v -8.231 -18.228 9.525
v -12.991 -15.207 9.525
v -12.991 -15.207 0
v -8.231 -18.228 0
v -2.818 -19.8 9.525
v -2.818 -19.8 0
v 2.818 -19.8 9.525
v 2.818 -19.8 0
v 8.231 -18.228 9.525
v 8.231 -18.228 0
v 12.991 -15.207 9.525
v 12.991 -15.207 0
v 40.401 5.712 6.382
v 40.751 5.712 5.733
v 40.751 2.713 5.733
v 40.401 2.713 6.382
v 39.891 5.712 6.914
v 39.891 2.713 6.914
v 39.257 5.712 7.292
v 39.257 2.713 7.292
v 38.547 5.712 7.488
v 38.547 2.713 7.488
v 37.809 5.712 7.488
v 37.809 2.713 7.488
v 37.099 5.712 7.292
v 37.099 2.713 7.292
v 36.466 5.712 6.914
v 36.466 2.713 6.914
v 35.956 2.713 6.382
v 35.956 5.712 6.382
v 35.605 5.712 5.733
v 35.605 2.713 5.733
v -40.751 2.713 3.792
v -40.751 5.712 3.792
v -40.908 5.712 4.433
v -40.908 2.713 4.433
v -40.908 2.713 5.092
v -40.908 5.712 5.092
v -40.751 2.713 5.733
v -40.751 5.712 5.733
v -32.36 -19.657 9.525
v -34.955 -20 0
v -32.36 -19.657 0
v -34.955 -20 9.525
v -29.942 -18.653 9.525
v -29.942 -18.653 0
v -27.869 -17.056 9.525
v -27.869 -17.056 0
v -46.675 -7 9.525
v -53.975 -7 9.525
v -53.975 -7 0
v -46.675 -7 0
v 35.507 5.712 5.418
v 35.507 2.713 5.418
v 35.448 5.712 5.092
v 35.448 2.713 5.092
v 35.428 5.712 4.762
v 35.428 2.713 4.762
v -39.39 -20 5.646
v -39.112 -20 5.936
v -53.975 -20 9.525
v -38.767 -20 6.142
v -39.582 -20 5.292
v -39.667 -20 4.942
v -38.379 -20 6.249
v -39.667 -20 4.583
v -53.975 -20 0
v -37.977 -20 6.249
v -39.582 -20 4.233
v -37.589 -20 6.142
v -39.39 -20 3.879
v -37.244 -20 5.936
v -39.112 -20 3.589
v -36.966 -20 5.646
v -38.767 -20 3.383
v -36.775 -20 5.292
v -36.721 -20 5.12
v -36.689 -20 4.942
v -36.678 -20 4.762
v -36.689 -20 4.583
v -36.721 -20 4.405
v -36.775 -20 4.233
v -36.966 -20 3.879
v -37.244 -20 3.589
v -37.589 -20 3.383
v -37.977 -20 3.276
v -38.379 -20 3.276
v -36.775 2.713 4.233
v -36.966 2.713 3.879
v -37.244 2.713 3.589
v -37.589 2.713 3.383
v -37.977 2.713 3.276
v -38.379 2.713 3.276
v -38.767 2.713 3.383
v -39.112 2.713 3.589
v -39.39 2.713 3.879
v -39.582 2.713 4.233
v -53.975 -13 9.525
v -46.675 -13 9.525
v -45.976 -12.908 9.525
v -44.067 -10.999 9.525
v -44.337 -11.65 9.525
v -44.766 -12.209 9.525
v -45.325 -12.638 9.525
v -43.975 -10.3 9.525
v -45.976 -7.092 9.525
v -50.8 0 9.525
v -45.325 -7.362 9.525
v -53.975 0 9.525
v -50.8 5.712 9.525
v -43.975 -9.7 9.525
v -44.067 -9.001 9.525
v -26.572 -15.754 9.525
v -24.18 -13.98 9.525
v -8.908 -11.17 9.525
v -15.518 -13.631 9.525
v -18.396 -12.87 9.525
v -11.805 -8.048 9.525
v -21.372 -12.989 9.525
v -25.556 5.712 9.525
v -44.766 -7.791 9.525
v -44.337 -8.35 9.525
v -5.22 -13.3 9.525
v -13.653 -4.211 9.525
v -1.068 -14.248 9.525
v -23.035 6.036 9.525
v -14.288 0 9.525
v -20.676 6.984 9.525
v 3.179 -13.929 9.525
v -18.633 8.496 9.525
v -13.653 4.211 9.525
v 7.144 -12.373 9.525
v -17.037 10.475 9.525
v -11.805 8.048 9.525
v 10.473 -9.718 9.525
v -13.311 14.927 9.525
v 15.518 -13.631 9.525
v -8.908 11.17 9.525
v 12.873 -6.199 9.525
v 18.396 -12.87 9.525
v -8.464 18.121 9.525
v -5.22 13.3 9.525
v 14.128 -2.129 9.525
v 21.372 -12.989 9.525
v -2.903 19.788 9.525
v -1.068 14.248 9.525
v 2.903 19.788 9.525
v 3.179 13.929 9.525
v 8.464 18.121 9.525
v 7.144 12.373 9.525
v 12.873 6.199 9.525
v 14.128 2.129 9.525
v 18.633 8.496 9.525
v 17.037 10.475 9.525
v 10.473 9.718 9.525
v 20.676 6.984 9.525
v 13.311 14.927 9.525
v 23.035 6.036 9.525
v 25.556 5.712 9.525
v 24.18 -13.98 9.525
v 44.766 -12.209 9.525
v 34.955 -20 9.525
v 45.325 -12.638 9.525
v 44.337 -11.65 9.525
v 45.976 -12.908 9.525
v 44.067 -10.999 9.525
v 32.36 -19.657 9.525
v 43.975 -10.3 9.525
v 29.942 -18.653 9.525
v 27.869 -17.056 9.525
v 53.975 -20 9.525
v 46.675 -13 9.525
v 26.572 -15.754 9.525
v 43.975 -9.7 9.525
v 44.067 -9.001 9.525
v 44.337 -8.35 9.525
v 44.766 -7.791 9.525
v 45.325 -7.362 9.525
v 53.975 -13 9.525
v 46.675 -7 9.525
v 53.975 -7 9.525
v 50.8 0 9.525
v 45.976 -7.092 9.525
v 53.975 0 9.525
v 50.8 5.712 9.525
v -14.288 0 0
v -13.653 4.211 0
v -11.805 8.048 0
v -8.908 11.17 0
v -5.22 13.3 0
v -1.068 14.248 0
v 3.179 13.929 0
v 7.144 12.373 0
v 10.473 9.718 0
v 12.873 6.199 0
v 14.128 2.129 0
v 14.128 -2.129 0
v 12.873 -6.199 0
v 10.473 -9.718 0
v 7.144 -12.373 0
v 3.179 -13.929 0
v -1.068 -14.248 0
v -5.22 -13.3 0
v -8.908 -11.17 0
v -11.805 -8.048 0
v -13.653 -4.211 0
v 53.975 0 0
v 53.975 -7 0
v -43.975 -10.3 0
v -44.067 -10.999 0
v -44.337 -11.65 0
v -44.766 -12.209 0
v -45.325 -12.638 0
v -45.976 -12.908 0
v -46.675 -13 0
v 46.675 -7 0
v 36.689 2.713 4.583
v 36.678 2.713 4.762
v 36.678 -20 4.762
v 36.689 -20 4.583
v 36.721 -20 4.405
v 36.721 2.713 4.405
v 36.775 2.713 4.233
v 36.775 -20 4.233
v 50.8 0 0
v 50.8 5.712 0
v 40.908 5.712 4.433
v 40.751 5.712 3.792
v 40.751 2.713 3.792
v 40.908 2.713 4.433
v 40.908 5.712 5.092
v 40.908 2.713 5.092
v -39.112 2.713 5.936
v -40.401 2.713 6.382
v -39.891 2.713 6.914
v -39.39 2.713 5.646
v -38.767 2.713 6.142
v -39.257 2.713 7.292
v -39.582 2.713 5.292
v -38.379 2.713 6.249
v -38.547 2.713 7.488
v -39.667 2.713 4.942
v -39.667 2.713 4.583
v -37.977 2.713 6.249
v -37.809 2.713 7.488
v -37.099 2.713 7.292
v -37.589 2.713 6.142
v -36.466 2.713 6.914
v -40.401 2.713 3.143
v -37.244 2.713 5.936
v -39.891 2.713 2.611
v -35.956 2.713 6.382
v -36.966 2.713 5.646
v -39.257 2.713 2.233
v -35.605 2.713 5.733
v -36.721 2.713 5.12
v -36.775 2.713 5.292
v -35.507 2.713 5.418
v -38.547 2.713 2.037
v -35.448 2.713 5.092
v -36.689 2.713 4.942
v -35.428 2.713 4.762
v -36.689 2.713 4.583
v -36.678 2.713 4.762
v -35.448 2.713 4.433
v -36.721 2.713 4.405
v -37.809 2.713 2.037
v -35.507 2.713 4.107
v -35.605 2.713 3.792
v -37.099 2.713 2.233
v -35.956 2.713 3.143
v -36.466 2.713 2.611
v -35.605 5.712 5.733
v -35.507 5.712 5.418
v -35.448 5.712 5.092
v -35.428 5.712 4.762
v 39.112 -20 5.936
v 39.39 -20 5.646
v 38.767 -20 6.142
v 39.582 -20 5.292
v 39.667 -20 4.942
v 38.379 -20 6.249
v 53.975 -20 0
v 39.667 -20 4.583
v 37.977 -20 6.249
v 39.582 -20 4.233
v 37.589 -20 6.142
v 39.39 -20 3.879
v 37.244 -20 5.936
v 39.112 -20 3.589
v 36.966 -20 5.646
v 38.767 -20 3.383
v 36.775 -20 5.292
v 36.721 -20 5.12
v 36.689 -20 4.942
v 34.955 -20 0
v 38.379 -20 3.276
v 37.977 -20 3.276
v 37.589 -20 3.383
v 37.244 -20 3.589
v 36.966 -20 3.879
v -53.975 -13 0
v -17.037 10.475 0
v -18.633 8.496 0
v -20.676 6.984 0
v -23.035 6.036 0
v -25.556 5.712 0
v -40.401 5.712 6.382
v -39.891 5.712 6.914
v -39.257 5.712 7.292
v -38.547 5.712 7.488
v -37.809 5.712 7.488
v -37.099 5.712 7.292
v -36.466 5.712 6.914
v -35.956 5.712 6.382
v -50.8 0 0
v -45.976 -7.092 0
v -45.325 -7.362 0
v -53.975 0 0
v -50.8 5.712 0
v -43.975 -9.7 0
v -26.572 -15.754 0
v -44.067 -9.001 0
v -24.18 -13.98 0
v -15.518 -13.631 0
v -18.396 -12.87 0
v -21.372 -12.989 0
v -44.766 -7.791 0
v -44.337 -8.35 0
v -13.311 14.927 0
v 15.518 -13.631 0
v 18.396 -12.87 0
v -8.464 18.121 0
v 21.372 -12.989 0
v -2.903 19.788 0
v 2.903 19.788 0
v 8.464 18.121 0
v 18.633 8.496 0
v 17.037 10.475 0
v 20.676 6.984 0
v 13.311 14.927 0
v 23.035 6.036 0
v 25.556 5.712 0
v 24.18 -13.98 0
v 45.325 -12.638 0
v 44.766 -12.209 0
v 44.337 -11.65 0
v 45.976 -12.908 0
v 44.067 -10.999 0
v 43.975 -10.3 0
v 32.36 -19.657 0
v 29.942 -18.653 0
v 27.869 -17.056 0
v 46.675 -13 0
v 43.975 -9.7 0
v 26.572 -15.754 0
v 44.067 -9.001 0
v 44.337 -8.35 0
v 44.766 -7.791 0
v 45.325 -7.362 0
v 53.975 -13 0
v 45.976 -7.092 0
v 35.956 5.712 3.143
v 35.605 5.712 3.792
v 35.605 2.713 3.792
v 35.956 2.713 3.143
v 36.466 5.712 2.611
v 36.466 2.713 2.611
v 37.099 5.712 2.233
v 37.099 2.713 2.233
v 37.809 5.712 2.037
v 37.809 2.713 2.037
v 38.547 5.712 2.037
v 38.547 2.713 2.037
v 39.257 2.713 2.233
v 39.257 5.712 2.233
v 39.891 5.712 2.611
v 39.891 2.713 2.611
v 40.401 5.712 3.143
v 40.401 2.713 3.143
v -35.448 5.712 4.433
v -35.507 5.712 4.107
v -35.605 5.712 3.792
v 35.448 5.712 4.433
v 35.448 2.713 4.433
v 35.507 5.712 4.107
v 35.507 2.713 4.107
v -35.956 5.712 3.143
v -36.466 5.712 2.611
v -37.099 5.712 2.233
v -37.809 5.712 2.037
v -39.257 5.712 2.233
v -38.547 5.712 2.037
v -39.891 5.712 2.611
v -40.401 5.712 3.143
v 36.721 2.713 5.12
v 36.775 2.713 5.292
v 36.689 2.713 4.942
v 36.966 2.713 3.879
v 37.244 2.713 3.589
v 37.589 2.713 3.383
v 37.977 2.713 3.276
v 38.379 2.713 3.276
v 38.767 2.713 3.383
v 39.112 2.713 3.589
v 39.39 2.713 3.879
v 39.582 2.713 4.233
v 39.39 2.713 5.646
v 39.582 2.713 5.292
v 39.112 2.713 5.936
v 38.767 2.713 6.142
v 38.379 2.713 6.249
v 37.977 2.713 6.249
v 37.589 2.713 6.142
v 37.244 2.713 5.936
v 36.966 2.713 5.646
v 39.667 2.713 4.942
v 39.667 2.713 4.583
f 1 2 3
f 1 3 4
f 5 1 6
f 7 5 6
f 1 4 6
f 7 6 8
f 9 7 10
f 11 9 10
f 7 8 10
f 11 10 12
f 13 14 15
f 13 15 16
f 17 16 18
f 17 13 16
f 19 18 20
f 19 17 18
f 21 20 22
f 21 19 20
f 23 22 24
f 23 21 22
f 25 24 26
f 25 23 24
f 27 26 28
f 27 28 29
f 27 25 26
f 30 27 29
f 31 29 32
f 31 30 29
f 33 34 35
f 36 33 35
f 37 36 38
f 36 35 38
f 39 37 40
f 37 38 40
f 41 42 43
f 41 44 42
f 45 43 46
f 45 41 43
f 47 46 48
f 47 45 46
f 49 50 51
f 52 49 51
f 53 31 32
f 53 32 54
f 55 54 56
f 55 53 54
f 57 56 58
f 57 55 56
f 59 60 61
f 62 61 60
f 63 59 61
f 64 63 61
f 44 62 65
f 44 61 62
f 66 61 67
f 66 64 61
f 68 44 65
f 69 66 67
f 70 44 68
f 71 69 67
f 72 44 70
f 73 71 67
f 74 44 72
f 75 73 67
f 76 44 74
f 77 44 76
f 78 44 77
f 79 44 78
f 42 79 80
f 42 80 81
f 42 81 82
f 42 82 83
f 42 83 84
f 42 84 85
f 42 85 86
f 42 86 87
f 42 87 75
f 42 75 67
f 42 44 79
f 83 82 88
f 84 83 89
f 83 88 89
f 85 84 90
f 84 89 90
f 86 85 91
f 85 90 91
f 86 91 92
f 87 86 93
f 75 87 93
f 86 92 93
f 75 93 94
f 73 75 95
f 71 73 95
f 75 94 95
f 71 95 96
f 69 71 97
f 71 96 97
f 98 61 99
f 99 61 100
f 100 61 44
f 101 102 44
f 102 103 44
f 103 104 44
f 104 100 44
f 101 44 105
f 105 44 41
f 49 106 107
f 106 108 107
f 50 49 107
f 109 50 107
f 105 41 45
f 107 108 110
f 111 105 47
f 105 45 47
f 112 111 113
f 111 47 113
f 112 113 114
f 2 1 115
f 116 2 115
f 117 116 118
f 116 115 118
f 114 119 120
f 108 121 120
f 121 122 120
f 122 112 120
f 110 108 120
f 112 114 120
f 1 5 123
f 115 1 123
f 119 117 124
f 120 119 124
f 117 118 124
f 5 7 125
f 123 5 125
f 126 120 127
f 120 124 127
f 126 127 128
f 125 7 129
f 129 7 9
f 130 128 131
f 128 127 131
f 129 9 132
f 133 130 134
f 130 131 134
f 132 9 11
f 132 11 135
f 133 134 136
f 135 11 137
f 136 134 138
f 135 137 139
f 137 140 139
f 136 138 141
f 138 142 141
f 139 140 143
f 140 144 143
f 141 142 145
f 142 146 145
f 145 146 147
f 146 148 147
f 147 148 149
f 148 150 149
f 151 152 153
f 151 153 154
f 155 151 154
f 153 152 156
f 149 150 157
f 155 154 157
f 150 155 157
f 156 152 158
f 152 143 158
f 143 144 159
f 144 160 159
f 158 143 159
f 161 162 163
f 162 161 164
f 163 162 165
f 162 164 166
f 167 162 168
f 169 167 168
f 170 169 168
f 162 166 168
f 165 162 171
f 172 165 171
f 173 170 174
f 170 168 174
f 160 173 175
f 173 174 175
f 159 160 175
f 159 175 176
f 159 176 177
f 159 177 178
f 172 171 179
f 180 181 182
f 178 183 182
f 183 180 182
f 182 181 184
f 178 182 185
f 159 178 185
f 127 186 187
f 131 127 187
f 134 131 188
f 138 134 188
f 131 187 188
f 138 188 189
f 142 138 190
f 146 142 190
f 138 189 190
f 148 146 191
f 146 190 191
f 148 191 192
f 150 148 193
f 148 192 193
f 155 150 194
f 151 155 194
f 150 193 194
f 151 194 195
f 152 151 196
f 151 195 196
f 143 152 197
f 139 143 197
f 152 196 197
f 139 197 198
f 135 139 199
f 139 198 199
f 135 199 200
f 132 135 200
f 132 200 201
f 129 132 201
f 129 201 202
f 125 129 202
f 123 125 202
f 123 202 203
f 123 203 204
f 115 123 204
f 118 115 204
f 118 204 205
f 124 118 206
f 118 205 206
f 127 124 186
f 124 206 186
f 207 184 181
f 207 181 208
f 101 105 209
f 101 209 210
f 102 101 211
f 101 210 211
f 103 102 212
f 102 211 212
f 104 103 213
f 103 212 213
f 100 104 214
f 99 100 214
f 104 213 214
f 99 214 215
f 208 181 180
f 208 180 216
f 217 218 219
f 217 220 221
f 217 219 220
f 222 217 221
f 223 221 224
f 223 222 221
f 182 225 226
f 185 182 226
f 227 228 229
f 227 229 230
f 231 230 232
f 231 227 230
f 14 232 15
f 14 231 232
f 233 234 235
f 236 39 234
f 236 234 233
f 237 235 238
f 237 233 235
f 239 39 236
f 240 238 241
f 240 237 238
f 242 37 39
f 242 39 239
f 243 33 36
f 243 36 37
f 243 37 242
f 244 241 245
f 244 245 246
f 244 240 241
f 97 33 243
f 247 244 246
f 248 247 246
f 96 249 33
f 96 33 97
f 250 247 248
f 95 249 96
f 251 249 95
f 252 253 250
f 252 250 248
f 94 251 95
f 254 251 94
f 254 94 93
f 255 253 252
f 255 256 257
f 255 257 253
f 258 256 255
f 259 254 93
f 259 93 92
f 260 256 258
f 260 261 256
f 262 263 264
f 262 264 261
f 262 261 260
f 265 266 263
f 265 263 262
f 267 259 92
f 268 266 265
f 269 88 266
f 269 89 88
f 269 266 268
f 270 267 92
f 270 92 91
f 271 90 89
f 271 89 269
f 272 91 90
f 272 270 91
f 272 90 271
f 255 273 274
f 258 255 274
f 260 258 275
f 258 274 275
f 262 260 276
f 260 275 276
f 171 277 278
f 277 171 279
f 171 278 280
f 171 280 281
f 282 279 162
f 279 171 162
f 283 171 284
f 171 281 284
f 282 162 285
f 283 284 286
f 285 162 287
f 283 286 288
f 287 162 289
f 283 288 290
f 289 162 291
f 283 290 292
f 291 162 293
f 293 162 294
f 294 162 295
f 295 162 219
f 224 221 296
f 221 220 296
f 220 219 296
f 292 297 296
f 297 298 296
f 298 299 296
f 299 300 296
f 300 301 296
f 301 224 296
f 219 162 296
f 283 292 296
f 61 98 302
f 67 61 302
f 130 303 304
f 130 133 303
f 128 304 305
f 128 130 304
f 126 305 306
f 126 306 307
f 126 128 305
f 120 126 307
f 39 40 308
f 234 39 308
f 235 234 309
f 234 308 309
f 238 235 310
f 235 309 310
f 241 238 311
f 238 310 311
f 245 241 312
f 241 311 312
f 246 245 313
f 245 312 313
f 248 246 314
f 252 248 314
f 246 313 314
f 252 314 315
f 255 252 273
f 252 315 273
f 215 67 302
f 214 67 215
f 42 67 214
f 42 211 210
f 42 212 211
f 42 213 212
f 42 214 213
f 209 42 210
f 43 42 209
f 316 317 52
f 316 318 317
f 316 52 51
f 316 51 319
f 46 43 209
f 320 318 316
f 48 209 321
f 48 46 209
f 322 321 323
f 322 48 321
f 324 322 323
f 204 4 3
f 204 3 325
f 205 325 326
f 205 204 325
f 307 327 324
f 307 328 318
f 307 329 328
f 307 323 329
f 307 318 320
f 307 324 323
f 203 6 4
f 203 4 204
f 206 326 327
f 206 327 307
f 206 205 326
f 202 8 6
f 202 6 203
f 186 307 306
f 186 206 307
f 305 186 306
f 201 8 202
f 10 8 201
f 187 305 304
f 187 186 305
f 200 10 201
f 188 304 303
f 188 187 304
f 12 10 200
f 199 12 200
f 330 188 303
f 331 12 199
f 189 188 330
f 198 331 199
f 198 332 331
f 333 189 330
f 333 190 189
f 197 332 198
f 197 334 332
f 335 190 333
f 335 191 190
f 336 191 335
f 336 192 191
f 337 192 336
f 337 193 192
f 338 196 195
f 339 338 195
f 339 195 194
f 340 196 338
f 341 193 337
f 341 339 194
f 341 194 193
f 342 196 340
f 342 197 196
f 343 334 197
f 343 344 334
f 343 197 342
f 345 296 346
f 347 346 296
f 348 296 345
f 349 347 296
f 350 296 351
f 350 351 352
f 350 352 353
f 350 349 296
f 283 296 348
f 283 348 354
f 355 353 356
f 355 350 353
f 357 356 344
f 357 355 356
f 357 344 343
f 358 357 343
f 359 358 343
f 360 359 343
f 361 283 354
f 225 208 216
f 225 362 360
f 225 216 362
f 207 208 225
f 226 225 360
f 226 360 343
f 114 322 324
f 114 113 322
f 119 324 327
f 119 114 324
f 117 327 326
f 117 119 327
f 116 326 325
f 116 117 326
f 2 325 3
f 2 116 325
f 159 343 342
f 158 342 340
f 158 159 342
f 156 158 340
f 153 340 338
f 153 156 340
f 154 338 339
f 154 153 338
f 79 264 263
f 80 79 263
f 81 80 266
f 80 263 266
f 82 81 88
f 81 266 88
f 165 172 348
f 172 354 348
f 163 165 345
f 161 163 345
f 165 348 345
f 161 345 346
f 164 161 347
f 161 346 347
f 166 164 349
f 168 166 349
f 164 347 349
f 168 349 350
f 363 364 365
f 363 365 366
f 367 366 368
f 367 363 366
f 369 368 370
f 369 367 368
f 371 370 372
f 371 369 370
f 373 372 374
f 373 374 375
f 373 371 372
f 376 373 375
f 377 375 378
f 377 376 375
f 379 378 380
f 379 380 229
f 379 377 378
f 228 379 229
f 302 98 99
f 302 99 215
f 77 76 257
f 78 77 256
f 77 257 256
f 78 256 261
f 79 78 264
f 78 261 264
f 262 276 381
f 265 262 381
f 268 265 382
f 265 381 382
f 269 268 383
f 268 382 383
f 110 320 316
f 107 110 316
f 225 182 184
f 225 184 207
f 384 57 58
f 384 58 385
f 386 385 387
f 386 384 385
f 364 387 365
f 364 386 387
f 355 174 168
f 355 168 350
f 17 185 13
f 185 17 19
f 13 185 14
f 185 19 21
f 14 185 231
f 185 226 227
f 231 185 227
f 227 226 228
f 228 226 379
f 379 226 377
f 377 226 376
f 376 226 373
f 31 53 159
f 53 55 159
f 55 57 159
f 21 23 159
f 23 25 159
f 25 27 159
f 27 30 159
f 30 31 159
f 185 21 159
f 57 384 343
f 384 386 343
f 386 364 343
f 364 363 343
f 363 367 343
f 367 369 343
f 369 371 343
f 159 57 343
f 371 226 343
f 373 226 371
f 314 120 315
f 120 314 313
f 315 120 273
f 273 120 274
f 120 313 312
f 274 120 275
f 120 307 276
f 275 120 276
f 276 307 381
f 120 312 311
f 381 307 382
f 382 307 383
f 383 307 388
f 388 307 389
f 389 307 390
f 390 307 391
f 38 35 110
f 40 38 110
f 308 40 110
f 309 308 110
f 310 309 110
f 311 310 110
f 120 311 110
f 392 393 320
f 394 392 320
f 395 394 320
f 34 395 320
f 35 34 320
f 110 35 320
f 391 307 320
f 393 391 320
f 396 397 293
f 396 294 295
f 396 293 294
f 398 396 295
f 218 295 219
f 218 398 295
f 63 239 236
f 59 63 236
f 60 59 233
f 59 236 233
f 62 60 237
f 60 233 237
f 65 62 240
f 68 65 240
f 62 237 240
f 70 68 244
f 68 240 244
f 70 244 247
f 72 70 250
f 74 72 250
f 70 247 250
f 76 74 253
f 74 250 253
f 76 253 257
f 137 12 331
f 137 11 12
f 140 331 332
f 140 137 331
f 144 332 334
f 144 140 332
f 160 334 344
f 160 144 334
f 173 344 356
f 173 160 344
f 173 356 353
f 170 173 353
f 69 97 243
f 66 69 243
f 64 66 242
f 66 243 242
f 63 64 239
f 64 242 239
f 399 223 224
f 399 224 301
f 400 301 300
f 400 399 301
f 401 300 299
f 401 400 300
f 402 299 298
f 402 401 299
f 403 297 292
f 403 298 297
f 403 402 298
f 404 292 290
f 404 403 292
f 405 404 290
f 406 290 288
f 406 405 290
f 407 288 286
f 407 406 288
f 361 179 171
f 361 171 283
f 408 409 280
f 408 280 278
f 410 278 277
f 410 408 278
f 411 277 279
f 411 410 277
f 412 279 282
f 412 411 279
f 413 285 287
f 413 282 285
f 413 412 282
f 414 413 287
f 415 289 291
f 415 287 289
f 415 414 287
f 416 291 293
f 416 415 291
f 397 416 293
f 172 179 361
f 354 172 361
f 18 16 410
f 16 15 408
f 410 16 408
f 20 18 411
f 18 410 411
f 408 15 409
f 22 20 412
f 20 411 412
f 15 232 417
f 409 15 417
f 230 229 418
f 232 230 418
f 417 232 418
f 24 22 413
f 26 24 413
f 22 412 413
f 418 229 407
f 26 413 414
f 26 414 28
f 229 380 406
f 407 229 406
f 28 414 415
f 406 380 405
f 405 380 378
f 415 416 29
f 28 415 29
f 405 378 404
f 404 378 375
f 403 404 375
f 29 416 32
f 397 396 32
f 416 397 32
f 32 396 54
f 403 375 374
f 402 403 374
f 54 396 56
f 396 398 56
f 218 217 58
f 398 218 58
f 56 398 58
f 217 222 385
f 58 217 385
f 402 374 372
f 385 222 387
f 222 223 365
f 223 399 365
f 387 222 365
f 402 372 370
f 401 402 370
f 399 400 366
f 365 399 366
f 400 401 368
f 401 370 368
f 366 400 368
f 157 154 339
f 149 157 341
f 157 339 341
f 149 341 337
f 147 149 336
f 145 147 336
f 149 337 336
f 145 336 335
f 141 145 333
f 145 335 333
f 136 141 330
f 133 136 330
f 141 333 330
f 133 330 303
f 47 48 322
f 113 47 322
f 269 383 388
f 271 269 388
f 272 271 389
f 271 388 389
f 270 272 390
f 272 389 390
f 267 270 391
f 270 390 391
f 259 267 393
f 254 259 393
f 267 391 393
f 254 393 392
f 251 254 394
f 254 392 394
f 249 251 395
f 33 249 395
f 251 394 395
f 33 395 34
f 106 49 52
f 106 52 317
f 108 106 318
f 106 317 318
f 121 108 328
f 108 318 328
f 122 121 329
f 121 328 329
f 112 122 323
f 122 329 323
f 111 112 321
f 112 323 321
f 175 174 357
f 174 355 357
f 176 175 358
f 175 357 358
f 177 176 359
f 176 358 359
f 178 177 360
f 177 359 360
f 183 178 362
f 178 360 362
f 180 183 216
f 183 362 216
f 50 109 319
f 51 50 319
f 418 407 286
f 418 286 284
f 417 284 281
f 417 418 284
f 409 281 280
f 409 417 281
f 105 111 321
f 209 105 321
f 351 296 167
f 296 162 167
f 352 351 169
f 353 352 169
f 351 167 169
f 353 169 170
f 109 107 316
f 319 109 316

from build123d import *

# Parameters (mm, degrees)
SKETCH1_R           = 14.2875
BOSS_EXTRUDE1_DEPTH = 9.525
SKETCH2_W           = 9.525
SKETCH2_H           = 20
BOSS_EXTRUDE3_DEPTH = 3.175
FILLET1_R           = 10
FILLET2_R           = 10
SKETCH3_R           = 2.75
SKETCH3_R_2         = 1.5
CUT_EXTRUDE1_DEPTH  = 3
SKETCH3_4_R         = 1.5
CUT_EXTRUDE2_DEPTH  = 61.54055588
SKETCH4_W           = 9.525
SKETCH4_H           = 6
CUT_EXTRUDE3_DEPTH  = 10
FILLET3_R           = 2.7


with BuildPart() as part:
    # Sketch1 → Boss-Extrude1 (new body)
    with BuildSketch(Plane.XY):
        with BuildLine():
            Line((50.8, -20), (50.8, 5.7125))
            Line((50.8, 5.7125), (19.166829257, 5.7125))
            ThreePointArc((19.166829257, 5.7125), (0, 20), (-19.166829257, 5.7125))
            Line((-19.166829257, 5.7125), (-50.8, 5.7125))
            Line((-50.8, 5.7125), (-50.8, -20))
            Line((-50.8, -20), (-30.8, -20))
            Line((-30.8, -20), (-18.485895637, -7.633587786))
            ThreePointArc((-18.485895637, -7.633587786), (0, -20), (18.485895637, -7.633587786))
            Line((18.485895637, -7.633587786), (30.8, -20))
            Line((30.8, -20), (50.8, -20))
        make_face()
        Circle(SKETCH1_R, mode=Mode.SUBTRACT)
    extrude(amount=BOSS_EXTRUDE1_DEPTH)

    # Sketch2 → Boss-Extrude3 (add)
    with BuildSketch(Plane(origin=(50.8, 0, 0), x_dir=(0, 0, -1), z_dir=(1, 0, 0))):
        with Locations((-4.7625, -10)):
            Rectangle(SKETCH2_W, SKETCH2_H)
    boss_extrude3 = extrude(amount=BOSS_EXTRUDE3_DEPTH)

    # Mirror1: Boss-Extrude3 across plane
    add(boss_extrude3.mirror(Plane(origin=(0, 0, 0), x_dir=(0, 0, 1), z_dir=(1, 0, 0))))

    # Fillet1
    fillet1_edges = [part.edges().sort_by_distance(p)[0] for p in [
        (-19.166829257, 5.7125, 4.7625),
        (19.166829257, 5.7125, 4.7625),
        (18.485895637, -7.633587786, 4.7625),
        (-18.485895637, -7.633587786, 4.7625),
    ]]
    fillet(fillet1_edges, radius=FILLET1_R)

    # Fillet2
    fillet2_edges = [part.edges().sort_by_distance(p)[0] for p in [
        (-30.8, -20, 4.7625),
        (30.8, -20, 4.7625),
    ]]
    fillet(fillet2_edges, radius=FILLET2_R)

    # Sketch3 → Cut-Extrude1 (cut)
    with BuildSketch(Plane(origin=(0, 5.7125, 0), x_dir=(1, 0, 0), z_dir=(0, 1, 0))):
        with Locations((-38.178080292, -4.7625)):
            Circle(SKETCH3_R)
        with Locations((-38.178080292, -4.7625)):
            Circle(SKETCH3_R_2, mode=Mode.SUBTRACT)
    cut_extrude1 = extrude(amount=-CUT_EXTRUDE1_DEPTH, mode=Mode.SUBTRACT)

    # Sketch3<4> → Cut-Extrude2 (cut, through all)
    with BuildSketch(Plane(origin=(0, 5.7125, 0), x_dir=(1, 0, 0), z_dir=(0, 1, 0))):
        with Locations((-38.178080292, -4.7625)):
            Circle(SKETCH3_4_R)
    cut_extrude2 = extrude(amount=-CUT_EXTRUDE2_DEPTH, mode=Mode.SUBTRACT)

    # Mirror2: Cut-Extrude1, Cut-Extrude2 across plane
    add(cut_extrude1.mirror(Plane(origin=(0, 0, 0), x_dir=(0, 0, 1), z_dir=(1, 0, 0))), mode=Mode.SUBTRACT)
    add(cut_extrude2.mirror(Plane(origin=(0, 0, 0), x_dir=(0, 0, 1), z_dir=(1, 0, 0))), mode=Mode.SUBTRACT)

    # Sketch4 → Cut-Extrude3 (cut)
    with BuildSketch(Plane(origin=(53.975, 0, 0), x_dir=(0, 0, -1), z_dir=(1, 0, 0))):
        with Locations((-4.7625, -10)):
            Rectangle(SKETCH4_W, SKETCH4_H)
    cut_extrude3 = extrude(amount=-CUT_EXTRUDE3_DEPTH, mode=Mode.SUBTRACT)

    # Mirror3: Cut-Extrude3 across plane
    add(cut_extrude3.mirror(Plane(origin=(0, 0, 0), x_dir=(0, 0, 1), z_dir=(1, 0, 0))), mode=Mode.SUBTRACT)

    # Fillet3
    fillet3_edges = [part.edges().sort_by_distance(p)[0] for p in [
        (43.975, -13, 4.7625),
        (43.975, -7, 4.7625),
        (-43.975, -13, 4.7625),
        (-43.975, -7, 4.7625),
    ]]
    fillet(fillet3_edges, radius=FILLET3_R)


solid = part.part
